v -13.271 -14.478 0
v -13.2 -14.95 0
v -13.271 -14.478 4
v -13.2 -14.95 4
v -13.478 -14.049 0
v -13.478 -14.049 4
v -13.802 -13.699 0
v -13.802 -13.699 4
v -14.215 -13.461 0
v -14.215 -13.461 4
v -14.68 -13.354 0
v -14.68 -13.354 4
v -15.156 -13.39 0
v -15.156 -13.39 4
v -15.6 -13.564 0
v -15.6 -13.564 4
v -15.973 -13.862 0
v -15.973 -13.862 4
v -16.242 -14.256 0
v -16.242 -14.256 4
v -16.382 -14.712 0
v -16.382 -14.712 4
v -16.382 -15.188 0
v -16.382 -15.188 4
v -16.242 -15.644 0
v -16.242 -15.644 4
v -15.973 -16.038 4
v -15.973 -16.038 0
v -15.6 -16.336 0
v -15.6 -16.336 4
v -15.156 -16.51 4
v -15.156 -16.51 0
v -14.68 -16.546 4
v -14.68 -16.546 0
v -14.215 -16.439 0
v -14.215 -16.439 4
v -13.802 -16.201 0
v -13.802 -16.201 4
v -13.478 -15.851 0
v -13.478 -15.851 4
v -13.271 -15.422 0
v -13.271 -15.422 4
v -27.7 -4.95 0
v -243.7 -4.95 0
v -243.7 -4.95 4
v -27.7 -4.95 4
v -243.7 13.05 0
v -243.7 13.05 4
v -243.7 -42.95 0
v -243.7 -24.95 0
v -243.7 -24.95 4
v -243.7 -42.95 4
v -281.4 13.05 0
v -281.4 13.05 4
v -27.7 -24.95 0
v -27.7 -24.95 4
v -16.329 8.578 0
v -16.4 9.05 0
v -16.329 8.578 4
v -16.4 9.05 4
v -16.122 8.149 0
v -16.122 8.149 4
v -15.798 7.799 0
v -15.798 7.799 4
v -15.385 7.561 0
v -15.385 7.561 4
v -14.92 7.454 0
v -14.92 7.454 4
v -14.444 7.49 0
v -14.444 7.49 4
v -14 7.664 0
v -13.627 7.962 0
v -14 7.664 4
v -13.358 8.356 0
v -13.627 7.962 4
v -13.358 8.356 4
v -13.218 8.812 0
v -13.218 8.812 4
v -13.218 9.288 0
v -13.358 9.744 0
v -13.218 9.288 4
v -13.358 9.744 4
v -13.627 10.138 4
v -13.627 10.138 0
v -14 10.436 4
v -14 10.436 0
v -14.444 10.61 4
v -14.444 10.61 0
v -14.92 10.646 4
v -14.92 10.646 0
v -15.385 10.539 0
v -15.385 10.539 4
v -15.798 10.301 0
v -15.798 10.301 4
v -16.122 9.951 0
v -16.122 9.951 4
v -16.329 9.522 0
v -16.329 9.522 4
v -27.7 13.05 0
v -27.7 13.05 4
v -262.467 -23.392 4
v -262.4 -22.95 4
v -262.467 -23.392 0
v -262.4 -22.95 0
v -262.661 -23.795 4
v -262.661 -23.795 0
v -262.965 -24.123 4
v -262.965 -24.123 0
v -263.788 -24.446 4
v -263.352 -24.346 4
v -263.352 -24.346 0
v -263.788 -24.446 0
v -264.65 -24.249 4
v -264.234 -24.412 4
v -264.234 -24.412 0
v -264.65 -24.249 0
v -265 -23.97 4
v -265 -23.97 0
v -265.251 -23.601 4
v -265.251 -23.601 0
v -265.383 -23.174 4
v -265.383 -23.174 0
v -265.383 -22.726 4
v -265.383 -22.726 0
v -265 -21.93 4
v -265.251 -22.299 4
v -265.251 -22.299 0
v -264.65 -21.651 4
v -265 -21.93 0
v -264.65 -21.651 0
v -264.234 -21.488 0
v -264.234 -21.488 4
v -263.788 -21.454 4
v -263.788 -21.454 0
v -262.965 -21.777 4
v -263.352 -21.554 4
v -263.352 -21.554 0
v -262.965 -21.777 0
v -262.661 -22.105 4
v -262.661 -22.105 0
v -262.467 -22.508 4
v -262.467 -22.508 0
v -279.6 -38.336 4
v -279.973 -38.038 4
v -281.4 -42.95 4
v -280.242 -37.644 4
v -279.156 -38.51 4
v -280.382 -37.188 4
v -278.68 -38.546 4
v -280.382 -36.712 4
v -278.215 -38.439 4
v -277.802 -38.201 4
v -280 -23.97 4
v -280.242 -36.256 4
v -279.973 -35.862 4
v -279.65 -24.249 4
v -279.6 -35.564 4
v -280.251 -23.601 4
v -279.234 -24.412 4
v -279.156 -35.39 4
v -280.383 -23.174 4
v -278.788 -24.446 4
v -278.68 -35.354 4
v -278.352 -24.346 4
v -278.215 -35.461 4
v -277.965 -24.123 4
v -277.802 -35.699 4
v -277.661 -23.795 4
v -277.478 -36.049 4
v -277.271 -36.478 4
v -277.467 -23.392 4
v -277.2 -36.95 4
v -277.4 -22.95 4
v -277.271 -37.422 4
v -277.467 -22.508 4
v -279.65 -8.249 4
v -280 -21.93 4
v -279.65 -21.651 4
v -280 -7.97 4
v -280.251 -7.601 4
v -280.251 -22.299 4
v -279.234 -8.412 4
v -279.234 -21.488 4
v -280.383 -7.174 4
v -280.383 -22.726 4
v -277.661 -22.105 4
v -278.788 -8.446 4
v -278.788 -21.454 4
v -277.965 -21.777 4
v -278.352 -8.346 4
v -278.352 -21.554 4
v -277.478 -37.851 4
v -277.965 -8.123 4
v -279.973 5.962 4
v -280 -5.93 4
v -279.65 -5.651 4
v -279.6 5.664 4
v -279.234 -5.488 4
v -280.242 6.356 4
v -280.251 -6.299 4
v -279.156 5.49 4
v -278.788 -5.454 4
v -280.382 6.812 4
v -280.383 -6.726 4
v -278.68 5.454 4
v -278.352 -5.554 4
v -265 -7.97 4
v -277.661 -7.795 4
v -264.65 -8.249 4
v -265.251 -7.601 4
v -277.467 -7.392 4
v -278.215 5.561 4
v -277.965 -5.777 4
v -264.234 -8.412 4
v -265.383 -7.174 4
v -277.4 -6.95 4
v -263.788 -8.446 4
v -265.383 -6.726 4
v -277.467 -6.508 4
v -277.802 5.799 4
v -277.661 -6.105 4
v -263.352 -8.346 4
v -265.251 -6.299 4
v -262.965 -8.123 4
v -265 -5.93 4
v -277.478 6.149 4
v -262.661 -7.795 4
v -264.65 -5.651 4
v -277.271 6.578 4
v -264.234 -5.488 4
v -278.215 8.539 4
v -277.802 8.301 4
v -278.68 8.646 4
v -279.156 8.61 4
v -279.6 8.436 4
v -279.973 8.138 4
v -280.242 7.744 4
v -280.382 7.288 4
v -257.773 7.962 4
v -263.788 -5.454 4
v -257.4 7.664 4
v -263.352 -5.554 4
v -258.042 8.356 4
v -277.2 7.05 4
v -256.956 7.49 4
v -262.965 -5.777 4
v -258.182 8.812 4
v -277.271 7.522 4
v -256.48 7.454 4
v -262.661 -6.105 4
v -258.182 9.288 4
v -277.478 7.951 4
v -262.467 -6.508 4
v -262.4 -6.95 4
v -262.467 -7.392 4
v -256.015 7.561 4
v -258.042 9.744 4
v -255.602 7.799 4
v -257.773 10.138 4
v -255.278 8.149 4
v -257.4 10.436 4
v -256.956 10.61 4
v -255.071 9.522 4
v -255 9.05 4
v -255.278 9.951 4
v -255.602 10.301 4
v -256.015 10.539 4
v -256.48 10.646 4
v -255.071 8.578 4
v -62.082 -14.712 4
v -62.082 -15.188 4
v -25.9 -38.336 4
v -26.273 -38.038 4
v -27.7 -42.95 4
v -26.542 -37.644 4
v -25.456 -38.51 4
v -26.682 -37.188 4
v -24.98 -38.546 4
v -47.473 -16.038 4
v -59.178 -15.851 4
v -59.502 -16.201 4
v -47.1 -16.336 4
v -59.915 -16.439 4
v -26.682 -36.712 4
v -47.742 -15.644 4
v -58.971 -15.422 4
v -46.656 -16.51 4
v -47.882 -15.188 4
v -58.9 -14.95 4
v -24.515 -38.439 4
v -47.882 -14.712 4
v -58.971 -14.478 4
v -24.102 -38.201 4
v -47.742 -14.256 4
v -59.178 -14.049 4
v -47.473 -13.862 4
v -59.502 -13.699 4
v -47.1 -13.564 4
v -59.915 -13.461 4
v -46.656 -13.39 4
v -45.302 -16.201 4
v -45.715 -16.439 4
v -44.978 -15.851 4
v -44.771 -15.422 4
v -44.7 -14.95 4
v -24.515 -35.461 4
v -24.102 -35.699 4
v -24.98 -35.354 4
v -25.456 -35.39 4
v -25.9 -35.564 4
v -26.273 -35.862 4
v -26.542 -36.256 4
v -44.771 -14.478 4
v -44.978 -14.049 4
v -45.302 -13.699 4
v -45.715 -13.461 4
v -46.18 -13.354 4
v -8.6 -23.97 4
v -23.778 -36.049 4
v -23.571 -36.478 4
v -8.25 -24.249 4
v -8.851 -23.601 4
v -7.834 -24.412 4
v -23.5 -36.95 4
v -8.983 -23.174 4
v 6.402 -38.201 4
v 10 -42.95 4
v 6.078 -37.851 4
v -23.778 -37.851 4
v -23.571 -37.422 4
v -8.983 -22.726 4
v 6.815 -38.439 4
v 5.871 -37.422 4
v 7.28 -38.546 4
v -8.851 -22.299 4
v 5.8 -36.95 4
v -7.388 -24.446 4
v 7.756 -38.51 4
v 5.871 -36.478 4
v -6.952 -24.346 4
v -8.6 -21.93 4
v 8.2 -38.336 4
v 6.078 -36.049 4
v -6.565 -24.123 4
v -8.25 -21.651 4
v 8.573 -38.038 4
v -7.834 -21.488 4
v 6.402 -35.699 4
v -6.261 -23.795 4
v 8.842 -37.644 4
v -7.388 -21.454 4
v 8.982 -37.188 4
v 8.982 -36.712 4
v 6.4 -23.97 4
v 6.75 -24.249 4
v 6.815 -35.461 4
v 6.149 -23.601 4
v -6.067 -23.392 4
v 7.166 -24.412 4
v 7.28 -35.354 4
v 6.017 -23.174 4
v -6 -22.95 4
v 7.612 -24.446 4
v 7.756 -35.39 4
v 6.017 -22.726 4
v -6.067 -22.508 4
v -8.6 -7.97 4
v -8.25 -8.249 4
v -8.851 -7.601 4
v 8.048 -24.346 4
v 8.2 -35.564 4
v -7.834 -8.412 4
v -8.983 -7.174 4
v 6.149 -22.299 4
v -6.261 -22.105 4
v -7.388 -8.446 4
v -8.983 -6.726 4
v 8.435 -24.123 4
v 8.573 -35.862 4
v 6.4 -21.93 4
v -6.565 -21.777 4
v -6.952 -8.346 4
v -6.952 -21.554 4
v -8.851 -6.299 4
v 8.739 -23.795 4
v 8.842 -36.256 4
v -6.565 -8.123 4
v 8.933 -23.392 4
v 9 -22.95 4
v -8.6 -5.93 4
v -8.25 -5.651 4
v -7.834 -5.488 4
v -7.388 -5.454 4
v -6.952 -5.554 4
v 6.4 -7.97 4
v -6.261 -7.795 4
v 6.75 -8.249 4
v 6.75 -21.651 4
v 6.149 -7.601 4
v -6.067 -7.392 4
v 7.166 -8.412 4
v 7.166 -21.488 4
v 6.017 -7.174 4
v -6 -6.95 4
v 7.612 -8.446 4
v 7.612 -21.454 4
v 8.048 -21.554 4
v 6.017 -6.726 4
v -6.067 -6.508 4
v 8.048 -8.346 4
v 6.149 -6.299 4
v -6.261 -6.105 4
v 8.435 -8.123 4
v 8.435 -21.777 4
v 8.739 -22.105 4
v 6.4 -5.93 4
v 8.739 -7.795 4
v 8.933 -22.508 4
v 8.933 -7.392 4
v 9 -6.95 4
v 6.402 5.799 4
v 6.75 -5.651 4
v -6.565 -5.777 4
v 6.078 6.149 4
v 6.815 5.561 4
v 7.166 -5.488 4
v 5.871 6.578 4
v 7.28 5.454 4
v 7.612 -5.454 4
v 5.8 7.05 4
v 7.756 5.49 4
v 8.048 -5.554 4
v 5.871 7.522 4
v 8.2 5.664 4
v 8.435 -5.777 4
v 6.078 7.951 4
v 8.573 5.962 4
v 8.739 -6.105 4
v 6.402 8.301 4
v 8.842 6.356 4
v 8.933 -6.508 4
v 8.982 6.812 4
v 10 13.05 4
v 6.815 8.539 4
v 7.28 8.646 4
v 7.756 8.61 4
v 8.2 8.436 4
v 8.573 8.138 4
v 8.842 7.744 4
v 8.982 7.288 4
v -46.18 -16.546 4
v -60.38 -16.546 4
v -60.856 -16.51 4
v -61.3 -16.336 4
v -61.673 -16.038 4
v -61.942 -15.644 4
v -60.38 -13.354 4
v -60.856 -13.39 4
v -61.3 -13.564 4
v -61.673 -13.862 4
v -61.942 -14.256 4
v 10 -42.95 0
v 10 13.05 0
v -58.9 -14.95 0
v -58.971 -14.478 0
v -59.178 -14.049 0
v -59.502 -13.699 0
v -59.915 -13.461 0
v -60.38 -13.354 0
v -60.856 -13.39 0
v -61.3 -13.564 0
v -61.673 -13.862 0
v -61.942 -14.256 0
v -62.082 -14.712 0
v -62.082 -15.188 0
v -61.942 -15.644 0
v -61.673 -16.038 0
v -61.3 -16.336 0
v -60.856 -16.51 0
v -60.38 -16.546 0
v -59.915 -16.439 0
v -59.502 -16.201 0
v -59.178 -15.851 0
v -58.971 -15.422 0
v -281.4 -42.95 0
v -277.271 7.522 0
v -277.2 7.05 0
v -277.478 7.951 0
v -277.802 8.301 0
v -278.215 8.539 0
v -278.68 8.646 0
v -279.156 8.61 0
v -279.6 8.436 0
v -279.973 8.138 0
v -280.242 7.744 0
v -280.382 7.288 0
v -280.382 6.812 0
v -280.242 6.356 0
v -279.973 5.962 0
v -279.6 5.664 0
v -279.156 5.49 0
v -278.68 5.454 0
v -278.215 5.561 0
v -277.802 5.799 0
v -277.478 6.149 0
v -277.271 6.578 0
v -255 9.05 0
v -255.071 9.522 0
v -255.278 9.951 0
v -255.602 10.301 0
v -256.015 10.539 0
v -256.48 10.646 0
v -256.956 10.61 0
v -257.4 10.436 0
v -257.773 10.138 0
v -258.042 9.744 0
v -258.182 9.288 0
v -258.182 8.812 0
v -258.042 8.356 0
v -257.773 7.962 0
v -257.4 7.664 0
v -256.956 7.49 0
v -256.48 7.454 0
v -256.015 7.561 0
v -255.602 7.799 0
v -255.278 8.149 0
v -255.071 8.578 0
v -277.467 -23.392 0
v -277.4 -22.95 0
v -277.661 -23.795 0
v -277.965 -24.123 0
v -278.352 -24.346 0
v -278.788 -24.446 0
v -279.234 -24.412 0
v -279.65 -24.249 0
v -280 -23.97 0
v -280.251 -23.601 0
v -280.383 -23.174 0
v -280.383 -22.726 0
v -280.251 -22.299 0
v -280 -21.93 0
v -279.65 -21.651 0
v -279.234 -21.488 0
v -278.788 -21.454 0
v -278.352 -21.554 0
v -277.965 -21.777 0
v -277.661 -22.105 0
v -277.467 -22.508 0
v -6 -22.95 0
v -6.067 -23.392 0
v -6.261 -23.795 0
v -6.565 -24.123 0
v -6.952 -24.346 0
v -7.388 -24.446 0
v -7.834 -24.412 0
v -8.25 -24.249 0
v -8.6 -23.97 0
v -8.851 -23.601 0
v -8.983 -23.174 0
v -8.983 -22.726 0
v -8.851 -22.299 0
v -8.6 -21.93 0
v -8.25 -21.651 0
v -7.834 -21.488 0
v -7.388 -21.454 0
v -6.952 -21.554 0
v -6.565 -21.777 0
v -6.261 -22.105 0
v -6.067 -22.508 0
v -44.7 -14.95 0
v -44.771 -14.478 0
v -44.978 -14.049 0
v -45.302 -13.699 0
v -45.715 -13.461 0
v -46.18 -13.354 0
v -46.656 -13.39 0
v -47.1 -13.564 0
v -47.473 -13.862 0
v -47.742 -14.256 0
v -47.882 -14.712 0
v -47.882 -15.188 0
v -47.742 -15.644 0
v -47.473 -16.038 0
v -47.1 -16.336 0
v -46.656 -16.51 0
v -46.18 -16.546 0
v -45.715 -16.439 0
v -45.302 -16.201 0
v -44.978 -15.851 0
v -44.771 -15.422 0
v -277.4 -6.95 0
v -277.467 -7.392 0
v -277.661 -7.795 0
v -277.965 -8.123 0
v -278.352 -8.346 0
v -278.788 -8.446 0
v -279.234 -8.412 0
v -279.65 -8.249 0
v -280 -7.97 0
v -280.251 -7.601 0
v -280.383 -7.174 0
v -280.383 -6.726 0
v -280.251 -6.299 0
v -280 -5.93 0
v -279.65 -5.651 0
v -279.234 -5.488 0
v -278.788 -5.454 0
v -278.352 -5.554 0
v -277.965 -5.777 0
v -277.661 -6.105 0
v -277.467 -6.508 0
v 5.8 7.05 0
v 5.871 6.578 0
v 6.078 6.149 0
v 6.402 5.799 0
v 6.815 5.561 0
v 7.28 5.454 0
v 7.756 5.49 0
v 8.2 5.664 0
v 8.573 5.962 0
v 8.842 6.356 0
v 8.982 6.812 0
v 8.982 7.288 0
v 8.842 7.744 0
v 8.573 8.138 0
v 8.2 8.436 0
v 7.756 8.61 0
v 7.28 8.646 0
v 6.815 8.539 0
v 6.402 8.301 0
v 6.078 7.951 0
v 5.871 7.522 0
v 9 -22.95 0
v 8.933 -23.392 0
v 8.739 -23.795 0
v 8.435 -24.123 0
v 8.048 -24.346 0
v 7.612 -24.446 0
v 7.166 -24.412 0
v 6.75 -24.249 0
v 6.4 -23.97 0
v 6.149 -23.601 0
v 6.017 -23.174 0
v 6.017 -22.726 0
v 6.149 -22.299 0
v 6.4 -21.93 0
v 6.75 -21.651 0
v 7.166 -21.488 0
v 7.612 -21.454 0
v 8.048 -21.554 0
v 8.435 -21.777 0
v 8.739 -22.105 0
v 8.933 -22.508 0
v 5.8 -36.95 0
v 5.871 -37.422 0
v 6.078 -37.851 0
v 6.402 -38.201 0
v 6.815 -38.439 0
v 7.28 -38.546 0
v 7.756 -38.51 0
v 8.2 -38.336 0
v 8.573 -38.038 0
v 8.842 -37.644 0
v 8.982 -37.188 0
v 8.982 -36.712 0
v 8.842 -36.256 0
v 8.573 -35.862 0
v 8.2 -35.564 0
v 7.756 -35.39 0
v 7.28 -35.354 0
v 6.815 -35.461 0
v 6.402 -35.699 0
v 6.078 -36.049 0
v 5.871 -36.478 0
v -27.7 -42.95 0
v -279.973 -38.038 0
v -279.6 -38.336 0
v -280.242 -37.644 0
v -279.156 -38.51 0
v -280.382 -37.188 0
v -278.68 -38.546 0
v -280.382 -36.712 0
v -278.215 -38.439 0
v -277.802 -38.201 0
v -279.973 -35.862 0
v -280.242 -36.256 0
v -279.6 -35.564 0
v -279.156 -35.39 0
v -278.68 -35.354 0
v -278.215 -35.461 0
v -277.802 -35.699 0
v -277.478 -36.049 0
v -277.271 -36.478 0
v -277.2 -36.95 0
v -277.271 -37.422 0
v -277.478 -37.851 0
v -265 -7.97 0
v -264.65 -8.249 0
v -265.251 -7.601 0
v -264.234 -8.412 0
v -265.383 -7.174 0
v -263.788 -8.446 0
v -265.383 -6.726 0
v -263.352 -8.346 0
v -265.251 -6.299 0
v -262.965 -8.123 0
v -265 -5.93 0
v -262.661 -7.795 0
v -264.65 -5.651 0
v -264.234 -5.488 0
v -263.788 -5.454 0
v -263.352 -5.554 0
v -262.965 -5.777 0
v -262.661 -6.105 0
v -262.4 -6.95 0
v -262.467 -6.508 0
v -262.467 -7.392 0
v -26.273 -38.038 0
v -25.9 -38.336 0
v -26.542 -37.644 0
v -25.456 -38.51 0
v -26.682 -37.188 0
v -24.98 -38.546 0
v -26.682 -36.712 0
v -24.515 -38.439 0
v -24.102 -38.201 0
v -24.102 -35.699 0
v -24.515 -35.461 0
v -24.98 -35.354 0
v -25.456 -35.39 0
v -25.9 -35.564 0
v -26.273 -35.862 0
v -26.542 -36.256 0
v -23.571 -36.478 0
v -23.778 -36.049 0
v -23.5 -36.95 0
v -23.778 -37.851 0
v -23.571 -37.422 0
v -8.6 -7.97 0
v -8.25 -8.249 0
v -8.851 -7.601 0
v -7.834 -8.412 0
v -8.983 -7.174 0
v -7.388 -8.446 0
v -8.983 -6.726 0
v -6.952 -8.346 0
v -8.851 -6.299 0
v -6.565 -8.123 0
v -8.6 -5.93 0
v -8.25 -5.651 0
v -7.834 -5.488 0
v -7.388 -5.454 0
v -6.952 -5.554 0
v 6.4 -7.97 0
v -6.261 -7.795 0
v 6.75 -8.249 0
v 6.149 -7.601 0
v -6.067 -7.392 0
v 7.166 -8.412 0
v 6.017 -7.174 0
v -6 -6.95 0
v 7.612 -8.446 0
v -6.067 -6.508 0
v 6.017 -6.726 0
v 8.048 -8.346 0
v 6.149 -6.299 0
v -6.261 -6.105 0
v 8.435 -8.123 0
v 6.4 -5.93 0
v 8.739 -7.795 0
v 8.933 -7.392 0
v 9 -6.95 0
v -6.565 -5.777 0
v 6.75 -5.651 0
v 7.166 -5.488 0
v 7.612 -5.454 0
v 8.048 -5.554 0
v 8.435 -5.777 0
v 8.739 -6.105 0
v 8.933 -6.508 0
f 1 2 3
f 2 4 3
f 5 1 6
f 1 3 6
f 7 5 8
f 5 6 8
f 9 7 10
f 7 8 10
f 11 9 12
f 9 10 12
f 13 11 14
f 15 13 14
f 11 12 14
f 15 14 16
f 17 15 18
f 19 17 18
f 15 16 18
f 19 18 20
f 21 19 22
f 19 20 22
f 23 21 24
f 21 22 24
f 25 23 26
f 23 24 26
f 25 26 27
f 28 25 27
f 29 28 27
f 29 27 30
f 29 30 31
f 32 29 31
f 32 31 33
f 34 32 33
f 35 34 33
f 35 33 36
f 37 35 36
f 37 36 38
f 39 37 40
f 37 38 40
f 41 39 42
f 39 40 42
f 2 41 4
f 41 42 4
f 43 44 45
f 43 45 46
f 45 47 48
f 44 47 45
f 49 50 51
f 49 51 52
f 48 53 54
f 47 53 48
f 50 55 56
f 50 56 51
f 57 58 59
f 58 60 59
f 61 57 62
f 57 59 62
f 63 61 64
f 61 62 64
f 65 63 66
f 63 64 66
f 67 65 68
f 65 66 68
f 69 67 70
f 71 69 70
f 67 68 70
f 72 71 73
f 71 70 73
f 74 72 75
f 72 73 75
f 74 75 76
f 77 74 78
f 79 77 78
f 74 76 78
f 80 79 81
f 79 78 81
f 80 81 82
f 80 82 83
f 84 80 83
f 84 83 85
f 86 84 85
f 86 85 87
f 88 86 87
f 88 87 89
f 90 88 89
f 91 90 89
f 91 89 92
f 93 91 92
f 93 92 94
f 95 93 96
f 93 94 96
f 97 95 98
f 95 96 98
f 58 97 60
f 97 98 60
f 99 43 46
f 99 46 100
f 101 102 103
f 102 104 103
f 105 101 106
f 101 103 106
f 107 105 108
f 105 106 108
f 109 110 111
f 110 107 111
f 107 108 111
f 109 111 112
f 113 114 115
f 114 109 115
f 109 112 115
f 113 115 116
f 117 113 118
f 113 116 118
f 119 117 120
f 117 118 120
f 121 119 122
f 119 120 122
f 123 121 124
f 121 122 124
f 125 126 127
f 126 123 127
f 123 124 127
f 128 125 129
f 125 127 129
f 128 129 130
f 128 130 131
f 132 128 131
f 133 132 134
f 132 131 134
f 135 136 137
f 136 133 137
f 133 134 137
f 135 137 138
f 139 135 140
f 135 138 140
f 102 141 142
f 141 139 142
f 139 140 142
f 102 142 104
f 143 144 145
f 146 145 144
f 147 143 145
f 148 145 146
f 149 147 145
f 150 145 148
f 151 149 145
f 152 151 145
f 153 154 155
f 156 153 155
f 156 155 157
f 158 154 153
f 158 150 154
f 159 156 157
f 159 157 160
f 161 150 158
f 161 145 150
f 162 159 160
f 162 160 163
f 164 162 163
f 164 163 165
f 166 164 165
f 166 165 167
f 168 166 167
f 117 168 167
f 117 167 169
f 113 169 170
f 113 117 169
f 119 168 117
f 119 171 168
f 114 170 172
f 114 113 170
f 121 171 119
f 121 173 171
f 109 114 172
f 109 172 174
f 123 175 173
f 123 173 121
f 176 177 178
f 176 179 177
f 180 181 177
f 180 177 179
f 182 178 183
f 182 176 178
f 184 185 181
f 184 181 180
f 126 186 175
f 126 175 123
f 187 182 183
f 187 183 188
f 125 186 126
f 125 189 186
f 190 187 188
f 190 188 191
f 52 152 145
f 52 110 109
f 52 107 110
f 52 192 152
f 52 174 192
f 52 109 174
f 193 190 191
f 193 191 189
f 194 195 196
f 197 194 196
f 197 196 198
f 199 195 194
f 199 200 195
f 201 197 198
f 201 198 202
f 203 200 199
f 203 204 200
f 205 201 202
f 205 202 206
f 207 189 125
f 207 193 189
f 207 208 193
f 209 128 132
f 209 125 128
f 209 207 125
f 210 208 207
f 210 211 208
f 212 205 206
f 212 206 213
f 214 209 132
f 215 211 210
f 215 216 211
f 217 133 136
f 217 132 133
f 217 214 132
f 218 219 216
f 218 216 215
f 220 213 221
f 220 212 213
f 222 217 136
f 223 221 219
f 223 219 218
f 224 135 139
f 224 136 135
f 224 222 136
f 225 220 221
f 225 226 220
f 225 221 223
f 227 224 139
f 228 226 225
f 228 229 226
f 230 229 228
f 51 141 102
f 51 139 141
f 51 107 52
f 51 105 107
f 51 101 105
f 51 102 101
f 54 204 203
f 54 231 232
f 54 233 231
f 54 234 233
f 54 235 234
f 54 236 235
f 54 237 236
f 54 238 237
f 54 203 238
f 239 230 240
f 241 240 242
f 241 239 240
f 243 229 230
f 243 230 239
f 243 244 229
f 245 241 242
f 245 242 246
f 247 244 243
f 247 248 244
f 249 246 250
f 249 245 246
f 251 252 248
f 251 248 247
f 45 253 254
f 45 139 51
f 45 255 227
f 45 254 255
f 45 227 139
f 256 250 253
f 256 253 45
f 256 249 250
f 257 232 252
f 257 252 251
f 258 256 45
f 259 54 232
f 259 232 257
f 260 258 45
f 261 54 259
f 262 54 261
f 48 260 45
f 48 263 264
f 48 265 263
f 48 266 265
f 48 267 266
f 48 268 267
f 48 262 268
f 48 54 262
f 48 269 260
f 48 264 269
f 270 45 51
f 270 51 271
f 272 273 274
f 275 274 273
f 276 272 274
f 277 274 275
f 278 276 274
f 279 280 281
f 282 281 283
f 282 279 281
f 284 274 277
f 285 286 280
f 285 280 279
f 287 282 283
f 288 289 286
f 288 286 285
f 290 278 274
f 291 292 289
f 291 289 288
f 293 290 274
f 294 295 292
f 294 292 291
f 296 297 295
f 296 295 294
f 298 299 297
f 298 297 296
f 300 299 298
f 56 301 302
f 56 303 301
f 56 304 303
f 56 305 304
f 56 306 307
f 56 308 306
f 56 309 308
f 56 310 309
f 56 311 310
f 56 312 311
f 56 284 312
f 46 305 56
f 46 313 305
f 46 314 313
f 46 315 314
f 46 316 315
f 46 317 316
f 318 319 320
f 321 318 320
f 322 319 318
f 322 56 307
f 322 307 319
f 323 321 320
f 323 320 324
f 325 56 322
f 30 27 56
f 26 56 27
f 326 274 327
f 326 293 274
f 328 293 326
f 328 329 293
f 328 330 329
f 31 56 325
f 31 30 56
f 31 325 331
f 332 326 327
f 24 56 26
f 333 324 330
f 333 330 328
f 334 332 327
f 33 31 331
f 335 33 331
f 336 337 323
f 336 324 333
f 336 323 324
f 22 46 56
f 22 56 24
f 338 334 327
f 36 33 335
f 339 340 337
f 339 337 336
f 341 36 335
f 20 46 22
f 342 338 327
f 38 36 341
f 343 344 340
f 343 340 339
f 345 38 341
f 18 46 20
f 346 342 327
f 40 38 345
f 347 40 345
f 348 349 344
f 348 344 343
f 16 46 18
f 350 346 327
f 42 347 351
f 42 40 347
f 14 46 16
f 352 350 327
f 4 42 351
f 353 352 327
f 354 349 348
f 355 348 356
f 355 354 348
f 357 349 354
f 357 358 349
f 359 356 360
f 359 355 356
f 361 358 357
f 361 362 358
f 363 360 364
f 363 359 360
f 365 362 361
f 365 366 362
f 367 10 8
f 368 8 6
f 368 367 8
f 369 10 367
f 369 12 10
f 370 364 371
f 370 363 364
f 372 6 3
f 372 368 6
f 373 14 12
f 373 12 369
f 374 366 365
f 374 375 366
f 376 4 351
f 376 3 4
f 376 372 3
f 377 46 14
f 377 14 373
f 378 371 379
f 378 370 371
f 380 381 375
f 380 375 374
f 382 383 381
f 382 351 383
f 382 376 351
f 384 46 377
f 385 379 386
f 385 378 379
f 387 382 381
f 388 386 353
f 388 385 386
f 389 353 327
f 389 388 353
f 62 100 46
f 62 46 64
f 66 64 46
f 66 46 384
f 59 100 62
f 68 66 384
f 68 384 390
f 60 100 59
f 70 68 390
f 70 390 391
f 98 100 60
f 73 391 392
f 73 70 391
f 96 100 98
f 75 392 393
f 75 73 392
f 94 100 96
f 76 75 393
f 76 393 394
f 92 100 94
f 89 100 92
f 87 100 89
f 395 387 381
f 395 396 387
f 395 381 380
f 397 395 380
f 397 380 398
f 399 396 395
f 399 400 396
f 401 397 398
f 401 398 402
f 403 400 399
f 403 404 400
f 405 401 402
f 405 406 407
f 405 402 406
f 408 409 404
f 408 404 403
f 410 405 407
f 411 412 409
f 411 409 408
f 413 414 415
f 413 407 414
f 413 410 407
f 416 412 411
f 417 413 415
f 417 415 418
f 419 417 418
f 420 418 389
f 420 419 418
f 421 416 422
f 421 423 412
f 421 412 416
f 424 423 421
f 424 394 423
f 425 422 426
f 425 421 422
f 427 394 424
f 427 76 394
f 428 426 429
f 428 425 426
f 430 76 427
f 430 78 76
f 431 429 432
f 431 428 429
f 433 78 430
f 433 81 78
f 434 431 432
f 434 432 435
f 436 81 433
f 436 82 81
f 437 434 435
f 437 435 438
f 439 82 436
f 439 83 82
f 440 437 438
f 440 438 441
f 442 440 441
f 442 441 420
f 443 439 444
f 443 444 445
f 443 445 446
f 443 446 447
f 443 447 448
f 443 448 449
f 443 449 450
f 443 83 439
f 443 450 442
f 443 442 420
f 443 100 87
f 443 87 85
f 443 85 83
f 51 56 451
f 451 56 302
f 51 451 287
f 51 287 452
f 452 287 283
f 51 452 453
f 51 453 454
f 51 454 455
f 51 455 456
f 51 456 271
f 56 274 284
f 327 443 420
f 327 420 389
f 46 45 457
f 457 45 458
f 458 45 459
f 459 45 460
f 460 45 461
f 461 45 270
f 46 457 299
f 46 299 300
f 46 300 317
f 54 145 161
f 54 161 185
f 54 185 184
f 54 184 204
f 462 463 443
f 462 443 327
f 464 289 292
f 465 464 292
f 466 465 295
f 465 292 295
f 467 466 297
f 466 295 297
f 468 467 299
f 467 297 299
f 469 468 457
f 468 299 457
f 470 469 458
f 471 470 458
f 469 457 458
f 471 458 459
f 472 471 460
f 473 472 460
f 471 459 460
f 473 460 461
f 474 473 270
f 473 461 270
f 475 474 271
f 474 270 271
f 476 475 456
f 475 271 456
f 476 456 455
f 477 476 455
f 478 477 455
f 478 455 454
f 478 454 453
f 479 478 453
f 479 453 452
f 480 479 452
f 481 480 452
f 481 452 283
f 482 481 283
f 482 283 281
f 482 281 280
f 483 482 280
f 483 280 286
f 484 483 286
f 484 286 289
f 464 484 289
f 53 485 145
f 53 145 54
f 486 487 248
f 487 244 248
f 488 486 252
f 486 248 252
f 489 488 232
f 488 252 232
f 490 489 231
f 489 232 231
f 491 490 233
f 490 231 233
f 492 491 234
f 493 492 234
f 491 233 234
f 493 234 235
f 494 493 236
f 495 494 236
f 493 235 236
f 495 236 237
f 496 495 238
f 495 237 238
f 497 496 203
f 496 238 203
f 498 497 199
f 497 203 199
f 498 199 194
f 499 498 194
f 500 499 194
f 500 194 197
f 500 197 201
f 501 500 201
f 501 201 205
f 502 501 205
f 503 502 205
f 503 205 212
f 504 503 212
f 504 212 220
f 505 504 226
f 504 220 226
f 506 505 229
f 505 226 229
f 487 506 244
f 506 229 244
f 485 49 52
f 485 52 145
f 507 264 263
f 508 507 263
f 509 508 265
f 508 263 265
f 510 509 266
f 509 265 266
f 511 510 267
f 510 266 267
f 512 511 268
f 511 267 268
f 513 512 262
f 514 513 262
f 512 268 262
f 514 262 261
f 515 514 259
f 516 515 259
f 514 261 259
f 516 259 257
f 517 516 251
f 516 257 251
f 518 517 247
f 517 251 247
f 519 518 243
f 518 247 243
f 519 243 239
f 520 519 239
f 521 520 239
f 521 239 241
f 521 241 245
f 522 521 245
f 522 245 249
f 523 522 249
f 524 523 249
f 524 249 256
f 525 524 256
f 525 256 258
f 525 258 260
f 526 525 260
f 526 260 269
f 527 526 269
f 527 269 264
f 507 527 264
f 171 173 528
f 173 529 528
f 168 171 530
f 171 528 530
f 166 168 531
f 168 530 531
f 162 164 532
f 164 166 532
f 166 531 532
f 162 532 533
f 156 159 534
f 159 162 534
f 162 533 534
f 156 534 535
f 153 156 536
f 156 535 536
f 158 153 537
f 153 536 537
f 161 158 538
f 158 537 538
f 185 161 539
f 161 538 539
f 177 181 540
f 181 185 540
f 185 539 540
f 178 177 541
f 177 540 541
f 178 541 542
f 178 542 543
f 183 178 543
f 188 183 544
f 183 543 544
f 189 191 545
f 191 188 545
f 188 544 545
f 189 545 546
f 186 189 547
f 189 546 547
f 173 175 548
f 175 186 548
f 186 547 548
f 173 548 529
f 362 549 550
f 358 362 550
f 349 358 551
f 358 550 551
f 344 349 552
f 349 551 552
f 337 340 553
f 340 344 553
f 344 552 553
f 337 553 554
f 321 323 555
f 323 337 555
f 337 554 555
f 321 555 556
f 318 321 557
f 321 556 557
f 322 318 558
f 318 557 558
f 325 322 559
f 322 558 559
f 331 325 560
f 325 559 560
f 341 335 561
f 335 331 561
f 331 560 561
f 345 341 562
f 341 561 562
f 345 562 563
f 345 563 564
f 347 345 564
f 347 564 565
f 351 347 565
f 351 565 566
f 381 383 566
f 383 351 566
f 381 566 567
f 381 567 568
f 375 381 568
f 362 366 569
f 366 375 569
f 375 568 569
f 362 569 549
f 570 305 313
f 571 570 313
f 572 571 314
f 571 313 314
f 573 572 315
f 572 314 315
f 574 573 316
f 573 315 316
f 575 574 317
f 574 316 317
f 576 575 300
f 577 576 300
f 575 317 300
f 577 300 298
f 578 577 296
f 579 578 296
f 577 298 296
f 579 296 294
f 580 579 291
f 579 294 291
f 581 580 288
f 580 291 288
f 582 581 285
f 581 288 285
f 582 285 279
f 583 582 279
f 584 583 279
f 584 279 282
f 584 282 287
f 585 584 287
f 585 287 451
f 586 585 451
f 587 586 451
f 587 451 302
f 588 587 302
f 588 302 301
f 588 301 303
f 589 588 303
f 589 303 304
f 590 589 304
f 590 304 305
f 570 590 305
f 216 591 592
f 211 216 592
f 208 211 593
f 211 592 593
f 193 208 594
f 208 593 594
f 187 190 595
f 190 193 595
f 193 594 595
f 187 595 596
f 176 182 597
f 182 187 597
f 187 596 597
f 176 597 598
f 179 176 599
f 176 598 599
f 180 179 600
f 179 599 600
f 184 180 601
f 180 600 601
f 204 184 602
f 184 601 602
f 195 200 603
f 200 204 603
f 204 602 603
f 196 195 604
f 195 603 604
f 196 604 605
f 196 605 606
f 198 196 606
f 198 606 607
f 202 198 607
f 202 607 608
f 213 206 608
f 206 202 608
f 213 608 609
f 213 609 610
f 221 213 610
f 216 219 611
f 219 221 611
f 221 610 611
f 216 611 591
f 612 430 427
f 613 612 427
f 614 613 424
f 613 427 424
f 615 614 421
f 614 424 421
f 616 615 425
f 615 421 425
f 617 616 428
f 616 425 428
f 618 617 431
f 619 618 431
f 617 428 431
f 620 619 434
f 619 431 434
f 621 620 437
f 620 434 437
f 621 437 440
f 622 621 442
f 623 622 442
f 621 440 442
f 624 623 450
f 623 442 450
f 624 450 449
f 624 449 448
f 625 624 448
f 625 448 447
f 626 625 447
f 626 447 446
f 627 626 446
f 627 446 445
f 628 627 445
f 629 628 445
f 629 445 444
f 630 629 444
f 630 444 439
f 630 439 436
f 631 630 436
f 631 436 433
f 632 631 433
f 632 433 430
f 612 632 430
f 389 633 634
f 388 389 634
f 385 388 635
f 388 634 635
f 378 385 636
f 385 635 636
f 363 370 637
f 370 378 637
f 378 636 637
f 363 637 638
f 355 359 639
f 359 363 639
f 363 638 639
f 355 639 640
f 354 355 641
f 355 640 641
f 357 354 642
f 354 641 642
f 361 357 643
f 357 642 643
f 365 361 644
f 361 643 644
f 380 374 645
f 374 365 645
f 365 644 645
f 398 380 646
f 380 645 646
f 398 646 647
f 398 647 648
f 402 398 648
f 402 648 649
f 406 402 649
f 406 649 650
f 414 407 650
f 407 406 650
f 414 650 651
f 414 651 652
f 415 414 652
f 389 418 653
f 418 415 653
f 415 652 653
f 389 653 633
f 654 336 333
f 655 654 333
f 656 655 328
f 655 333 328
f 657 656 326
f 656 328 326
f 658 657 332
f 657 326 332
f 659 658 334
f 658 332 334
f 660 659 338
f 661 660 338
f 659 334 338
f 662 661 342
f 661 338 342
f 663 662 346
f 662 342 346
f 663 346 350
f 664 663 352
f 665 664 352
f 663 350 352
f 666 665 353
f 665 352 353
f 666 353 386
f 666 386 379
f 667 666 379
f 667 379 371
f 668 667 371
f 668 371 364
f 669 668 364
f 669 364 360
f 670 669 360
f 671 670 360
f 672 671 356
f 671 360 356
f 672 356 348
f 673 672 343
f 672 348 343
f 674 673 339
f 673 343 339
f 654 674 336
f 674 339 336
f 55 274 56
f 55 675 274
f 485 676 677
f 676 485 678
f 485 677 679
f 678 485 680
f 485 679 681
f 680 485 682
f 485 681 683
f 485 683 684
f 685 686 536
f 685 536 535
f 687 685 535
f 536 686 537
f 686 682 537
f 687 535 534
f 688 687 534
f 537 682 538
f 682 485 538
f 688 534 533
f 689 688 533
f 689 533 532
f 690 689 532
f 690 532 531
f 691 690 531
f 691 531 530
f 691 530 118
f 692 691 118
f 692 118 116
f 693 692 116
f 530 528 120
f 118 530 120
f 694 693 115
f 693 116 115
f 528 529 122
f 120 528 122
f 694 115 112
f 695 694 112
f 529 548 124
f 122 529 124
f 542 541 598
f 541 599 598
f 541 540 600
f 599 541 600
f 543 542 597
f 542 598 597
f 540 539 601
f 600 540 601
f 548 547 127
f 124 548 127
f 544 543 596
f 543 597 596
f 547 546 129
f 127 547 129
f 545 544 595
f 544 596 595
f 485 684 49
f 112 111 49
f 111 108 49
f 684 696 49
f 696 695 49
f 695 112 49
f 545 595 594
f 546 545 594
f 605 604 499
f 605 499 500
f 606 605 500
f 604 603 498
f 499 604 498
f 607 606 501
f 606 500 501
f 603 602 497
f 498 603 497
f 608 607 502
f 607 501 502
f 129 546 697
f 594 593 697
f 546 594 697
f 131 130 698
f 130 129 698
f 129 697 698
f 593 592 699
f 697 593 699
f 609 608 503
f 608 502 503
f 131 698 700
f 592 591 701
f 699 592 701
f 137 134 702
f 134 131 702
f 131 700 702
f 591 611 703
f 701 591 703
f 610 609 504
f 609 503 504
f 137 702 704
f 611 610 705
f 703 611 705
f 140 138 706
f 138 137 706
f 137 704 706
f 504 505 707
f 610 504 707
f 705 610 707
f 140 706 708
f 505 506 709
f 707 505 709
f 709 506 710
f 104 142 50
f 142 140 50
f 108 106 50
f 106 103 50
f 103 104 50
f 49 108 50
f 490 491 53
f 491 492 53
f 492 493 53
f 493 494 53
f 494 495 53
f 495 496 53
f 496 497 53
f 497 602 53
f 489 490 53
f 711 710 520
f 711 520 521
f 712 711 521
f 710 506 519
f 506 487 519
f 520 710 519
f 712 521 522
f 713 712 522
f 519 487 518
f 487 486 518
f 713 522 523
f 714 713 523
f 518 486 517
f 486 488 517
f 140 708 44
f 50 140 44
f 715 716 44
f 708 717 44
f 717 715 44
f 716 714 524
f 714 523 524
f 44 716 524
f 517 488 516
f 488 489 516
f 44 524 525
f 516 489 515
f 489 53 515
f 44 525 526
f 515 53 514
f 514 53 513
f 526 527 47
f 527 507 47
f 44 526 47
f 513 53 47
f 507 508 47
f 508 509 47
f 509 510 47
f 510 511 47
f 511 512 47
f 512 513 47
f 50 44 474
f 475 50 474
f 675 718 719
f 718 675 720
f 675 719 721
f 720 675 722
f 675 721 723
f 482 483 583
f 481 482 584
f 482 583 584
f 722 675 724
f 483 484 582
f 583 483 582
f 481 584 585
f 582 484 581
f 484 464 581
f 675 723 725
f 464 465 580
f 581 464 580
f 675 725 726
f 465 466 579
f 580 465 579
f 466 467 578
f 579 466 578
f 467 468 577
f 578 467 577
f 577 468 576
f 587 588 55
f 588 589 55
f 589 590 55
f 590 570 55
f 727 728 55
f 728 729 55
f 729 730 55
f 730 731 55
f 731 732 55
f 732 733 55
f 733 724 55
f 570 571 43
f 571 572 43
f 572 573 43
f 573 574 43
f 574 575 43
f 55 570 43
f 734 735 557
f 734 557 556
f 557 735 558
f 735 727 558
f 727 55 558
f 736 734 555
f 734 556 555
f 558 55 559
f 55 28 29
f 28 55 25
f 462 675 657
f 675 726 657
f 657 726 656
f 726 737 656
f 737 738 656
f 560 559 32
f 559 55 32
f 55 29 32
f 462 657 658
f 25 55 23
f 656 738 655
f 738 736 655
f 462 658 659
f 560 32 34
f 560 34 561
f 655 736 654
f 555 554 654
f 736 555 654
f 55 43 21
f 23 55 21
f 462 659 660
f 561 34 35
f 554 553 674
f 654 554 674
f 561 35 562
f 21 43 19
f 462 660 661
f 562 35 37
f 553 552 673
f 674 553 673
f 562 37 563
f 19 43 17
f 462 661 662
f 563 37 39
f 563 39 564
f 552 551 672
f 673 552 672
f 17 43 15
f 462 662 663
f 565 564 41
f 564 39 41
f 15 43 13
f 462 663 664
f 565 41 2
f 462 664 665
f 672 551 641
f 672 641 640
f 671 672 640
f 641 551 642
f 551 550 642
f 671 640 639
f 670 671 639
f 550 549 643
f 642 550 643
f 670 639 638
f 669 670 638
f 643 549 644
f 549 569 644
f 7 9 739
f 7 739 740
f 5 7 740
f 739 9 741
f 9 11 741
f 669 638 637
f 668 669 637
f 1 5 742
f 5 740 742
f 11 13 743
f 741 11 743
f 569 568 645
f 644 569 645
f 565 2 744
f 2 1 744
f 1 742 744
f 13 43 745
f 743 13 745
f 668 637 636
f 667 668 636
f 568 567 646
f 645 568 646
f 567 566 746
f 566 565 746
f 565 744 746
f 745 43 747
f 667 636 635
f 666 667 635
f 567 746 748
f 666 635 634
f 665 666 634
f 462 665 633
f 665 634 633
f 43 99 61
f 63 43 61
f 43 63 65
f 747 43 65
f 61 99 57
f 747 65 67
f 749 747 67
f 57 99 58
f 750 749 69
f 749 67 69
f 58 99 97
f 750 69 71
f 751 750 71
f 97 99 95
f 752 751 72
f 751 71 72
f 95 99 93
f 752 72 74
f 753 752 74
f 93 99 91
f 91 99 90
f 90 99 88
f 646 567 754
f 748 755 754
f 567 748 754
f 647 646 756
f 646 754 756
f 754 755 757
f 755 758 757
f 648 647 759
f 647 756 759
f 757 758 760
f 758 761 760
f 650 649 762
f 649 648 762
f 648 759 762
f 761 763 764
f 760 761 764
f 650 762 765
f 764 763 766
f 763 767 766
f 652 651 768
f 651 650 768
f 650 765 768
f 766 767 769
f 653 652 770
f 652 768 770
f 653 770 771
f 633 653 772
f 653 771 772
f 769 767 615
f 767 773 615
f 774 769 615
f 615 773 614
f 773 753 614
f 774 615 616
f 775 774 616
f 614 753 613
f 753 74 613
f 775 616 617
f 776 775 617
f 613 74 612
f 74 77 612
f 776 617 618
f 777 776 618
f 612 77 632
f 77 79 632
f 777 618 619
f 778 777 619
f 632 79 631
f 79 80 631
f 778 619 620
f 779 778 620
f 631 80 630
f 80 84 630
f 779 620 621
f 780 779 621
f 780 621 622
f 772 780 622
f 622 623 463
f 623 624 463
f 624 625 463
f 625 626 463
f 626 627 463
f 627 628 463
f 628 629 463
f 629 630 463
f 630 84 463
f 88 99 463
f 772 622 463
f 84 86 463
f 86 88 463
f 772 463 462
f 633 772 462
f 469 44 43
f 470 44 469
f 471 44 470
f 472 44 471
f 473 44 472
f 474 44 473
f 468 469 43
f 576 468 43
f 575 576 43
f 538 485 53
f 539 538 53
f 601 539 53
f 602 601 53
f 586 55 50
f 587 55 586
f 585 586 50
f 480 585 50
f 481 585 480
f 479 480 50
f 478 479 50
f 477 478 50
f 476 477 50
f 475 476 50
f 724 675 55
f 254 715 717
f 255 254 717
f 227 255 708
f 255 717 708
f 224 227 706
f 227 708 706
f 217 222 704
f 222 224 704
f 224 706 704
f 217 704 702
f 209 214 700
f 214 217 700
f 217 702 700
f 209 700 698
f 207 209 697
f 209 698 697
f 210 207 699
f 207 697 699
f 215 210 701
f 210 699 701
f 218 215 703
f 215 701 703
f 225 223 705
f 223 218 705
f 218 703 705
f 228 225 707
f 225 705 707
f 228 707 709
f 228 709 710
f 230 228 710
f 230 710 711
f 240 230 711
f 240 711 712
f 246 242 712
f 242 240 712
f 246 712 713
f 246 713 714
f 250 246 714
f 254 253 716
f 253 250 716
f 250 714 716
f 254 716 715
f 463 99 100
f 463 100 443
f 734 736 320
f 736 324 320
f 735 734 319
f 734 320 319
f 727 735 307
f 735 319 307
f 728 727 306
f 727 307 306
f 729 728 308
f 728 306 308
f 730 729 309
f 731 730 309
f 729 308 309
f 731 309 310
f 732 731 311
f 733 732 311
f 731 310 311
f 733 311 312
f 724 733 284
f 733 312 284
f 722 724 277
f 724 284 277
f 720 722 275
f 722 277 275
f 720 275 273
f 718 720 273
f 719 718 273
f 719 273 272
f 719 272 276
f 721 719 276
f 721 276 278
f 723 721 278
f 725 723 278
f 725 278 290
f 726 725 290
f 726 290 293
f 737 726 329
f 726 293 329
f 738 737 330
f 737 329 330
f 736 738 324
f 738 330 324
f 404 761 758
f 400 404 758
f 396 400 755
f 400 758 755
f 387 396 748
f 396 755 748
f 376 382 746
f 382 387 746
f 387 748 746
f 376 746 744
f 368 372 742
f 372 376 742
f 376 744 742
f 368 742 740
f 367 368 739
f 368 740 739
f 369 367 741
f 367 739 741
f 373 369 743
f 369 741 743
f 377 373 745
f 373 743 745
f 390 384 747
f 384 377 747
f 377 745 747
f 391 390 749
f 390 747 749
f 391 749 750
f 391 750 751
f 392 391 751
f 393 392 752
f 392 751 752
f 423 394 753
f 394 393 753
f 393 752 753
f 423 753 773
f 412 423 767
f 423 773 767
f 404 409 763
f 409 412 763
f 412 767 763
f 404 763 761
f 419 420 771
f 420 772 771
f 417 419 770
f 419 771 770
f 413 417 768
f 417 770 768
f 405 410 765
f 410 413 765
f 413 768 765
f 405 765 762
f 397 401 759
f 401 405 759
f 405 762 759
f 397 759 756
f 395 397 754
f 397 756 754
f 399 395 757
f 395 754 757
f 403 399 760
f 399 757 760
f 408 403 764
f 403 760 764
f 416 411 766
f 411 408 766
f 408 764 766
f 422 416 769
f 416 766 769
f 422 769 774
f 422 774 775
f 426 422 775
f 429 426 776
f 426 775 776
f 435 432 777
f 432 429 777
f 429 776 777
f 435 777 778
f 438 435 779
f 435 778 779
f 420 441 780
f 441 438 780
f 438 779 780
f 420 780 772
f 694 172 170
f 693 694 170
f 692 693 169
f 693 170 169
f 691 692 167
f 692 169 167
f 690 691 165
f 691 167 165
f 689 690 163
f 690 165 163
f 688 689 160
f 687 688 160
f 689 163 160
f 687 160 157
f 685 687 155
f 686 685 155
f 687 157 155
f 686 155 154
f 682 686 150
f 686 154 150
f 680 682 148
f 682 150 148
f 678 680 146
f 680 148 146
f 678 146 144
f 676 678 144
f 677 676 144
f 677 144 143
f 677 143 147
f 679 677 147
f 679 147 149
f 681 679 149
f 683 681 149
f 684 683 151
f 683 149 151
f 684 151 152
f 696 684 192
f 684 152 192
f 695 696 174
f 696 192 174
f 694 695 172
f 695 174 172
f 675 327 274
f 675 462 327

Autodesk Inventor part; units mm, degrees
ref_plane "YZ Plane" through (0, 0, 0) normal (1, 0, 0) x (0, 1, 0)
ref_plane "XZ Plane" through (0, 0, 0) normal (0, 1, 0) x (-1, 0, 0)
ref_plane "XY Plane" through (0, 0, 0) normal (0, 0, 1) x (1, 0, 0)
sketch "Эскиз1" plane through (0, 0, 0) normal (0, 0, 1) x (1, 0, 0)
  circle A0 centre (-7.5, -22.95) radius 1.5 projected
  circle A1 centre (7.5, -22.95) radius 1.5 projected
  circle A2 centre (7.5, -6.95) radius 1.5 projected
  circle A3 centre (-7.5, -6.95) radius 1.5 projected
  line L0 (-281.4, 13.05) -> (10, 13.05)
  line L1 (10, 13.05) -> (10, -42.95)
  line L2 (10, -42.95) -> (-281.4, -42.95)
  line L3 (-281.4, -42.95) -> (-281.4, 13.05)
  line L4 (-281.4, 13.05) -> (10, -42.95) construction
  line L5 (10, 13.05) -> (-281.4, -42.95) construction
  line L6 (-135.7, -14.95) -> (-135.7, -42.95) construction
  circle A4 centre (-263.9, -22.95) radius 1.5
  circle A5 centre (-278.9, -22.95) radius 1.5
  circle A6 centre (-278.9, -6.95) radius 1.5
  circle A7 centre (-263.9, -6.95) radius 1.5
  point P0 (0, 0)
  dimension "d5" = 291.4
  dimension "d8" = 2.5
  dimension "d9" = 20
  dimension "d10" = 20
extrude "Выдавливание1" add sketch "Эскиз1" along normal blind 4
sketch "Эскиз4" plane through (0, 0, 0) normal (0, 0, -1) x (-1, 0, 0)
  line L0 (27.7, 31.05) -> (243.7, 31.05)
  line L1 (243.7, 31.05) -> (243.7, -4.95)
  line L2 (243.7, -4.95) -> (27.7, -4.95)
  line L3 (27.7, -4.95) -> (27.7, 31.05)
  line L4 (-10, 13.05) -> (281.4, 13.05) projected
  line L5 (27.7, 31.05) -> (243.7, -4.95) construction
  line L6 (243.7, 31.05) -> (27.7, -4.95) construction
  point P0 (0, 0)
  point P1 (135.7, 13.05)
  point P2 (243.7, 13.05)
  dimension "d13" = 18
  dimension "d14" = 216
extrude "Выдавливание3" cut sketch "Эскиз4" against normal blind 4
ref_plane "РабПлоскость1" through (-281.4, -14.95, 0) normal (0, -1, 0) x (1, 0, 0)
mirror "Зеркальное отражение1" about plane through (-281.4, -14.95, 0) normal (0, -1, 0) of "Выдавливание3"
sketch "Эскиз8" plane through (0, 0, 4) normal (0, 0, 1) x (1, 0, 0)
  circle A0 centre (-278.8, -36.95) radius 1.6 projected
  line L0 (-243.7, -42.95) -> (-243.7, -24.95) projected
  line L1 (-281.4, -42.95) -> (-243.7, -42.95) projected
  circle A1 centre (-278.8, 7.05) radius 1.6
  point P0 (0, 0)
  dimension "d48" = 3.2
  dimension "d49" = 44
extrude "Выдавливание7" cut sketch "Эскиз8" against normal blind 10
ref_plane "РабПлоскость2" through (-135.7, -42.95, 0) normal (-1, 0, 0) x (0, 0, 1)
mirror "Зеркальное отражение2" about plane through (-135.7, -42.95, 0) normal (-1, 0, 0) of "Выдавливание7"
sketch "Эскиз10" plane through (0, 0, 4) normal (0, 0, 1) x (1, 0, 0)
  circle A0 centre (7.4, -36.95) radius 1.6 projected
  circle A1 centre (-25.1, -36.95) radius 1.6
  point P0 (0, 0)
  dimension "d50" = 3.2
  dimension "d51" = 32.5
extrude "Выдавливание8" cut sketch "Эскиз10" against normal blind 10
sketch "Эскиз11" plane through (0, 0, 4) normal (0, 0, 1) x (1, 0, 0)
  circle A0 centre (-256.6, 9.05) radius 1.6 projected
  point P0 (0, 0)
extrude "Выдавливание9" cut sketch "Эскиз11" against normal blind 10
mirror "Зеркальное отражение4" about plane through (-135.7, -42.95, 0) normal (-1, 0, 0) of "Выдавливание9"
sketch "Эскиз12" plane through (0, 0, 4) normal (0, 0, 1) x (1, 0, 0)
  circle A0 centre (-14.8, -14.95) radius 1.6
  line L0 (-243.7, -24.95) -> (-27.7, -24.95) projected
  circle A1 centre (-14.8, 9.05) radius 1.6 projected
  line L1 (-14.8, -24.95) -> (-14.8, 9.05) construction
  circle A2 centre (-60.5, -14.95) radius 1.6
  circle A3 centre (-46.3, -14.95) radius 1.6 projected
  point P0 (0, 0)
  dimension "d56" = 3.2
  dimension "d57" = 10
  dimension "d58" = 3.2
  dimension "d59" = 45.7
extrude "Выдавливание10" cut sketch "Эскиз12" against normal blind 10 contours A0 | A2 | A3
properties part number "центр_рейка" material "Древесина (береза)"
